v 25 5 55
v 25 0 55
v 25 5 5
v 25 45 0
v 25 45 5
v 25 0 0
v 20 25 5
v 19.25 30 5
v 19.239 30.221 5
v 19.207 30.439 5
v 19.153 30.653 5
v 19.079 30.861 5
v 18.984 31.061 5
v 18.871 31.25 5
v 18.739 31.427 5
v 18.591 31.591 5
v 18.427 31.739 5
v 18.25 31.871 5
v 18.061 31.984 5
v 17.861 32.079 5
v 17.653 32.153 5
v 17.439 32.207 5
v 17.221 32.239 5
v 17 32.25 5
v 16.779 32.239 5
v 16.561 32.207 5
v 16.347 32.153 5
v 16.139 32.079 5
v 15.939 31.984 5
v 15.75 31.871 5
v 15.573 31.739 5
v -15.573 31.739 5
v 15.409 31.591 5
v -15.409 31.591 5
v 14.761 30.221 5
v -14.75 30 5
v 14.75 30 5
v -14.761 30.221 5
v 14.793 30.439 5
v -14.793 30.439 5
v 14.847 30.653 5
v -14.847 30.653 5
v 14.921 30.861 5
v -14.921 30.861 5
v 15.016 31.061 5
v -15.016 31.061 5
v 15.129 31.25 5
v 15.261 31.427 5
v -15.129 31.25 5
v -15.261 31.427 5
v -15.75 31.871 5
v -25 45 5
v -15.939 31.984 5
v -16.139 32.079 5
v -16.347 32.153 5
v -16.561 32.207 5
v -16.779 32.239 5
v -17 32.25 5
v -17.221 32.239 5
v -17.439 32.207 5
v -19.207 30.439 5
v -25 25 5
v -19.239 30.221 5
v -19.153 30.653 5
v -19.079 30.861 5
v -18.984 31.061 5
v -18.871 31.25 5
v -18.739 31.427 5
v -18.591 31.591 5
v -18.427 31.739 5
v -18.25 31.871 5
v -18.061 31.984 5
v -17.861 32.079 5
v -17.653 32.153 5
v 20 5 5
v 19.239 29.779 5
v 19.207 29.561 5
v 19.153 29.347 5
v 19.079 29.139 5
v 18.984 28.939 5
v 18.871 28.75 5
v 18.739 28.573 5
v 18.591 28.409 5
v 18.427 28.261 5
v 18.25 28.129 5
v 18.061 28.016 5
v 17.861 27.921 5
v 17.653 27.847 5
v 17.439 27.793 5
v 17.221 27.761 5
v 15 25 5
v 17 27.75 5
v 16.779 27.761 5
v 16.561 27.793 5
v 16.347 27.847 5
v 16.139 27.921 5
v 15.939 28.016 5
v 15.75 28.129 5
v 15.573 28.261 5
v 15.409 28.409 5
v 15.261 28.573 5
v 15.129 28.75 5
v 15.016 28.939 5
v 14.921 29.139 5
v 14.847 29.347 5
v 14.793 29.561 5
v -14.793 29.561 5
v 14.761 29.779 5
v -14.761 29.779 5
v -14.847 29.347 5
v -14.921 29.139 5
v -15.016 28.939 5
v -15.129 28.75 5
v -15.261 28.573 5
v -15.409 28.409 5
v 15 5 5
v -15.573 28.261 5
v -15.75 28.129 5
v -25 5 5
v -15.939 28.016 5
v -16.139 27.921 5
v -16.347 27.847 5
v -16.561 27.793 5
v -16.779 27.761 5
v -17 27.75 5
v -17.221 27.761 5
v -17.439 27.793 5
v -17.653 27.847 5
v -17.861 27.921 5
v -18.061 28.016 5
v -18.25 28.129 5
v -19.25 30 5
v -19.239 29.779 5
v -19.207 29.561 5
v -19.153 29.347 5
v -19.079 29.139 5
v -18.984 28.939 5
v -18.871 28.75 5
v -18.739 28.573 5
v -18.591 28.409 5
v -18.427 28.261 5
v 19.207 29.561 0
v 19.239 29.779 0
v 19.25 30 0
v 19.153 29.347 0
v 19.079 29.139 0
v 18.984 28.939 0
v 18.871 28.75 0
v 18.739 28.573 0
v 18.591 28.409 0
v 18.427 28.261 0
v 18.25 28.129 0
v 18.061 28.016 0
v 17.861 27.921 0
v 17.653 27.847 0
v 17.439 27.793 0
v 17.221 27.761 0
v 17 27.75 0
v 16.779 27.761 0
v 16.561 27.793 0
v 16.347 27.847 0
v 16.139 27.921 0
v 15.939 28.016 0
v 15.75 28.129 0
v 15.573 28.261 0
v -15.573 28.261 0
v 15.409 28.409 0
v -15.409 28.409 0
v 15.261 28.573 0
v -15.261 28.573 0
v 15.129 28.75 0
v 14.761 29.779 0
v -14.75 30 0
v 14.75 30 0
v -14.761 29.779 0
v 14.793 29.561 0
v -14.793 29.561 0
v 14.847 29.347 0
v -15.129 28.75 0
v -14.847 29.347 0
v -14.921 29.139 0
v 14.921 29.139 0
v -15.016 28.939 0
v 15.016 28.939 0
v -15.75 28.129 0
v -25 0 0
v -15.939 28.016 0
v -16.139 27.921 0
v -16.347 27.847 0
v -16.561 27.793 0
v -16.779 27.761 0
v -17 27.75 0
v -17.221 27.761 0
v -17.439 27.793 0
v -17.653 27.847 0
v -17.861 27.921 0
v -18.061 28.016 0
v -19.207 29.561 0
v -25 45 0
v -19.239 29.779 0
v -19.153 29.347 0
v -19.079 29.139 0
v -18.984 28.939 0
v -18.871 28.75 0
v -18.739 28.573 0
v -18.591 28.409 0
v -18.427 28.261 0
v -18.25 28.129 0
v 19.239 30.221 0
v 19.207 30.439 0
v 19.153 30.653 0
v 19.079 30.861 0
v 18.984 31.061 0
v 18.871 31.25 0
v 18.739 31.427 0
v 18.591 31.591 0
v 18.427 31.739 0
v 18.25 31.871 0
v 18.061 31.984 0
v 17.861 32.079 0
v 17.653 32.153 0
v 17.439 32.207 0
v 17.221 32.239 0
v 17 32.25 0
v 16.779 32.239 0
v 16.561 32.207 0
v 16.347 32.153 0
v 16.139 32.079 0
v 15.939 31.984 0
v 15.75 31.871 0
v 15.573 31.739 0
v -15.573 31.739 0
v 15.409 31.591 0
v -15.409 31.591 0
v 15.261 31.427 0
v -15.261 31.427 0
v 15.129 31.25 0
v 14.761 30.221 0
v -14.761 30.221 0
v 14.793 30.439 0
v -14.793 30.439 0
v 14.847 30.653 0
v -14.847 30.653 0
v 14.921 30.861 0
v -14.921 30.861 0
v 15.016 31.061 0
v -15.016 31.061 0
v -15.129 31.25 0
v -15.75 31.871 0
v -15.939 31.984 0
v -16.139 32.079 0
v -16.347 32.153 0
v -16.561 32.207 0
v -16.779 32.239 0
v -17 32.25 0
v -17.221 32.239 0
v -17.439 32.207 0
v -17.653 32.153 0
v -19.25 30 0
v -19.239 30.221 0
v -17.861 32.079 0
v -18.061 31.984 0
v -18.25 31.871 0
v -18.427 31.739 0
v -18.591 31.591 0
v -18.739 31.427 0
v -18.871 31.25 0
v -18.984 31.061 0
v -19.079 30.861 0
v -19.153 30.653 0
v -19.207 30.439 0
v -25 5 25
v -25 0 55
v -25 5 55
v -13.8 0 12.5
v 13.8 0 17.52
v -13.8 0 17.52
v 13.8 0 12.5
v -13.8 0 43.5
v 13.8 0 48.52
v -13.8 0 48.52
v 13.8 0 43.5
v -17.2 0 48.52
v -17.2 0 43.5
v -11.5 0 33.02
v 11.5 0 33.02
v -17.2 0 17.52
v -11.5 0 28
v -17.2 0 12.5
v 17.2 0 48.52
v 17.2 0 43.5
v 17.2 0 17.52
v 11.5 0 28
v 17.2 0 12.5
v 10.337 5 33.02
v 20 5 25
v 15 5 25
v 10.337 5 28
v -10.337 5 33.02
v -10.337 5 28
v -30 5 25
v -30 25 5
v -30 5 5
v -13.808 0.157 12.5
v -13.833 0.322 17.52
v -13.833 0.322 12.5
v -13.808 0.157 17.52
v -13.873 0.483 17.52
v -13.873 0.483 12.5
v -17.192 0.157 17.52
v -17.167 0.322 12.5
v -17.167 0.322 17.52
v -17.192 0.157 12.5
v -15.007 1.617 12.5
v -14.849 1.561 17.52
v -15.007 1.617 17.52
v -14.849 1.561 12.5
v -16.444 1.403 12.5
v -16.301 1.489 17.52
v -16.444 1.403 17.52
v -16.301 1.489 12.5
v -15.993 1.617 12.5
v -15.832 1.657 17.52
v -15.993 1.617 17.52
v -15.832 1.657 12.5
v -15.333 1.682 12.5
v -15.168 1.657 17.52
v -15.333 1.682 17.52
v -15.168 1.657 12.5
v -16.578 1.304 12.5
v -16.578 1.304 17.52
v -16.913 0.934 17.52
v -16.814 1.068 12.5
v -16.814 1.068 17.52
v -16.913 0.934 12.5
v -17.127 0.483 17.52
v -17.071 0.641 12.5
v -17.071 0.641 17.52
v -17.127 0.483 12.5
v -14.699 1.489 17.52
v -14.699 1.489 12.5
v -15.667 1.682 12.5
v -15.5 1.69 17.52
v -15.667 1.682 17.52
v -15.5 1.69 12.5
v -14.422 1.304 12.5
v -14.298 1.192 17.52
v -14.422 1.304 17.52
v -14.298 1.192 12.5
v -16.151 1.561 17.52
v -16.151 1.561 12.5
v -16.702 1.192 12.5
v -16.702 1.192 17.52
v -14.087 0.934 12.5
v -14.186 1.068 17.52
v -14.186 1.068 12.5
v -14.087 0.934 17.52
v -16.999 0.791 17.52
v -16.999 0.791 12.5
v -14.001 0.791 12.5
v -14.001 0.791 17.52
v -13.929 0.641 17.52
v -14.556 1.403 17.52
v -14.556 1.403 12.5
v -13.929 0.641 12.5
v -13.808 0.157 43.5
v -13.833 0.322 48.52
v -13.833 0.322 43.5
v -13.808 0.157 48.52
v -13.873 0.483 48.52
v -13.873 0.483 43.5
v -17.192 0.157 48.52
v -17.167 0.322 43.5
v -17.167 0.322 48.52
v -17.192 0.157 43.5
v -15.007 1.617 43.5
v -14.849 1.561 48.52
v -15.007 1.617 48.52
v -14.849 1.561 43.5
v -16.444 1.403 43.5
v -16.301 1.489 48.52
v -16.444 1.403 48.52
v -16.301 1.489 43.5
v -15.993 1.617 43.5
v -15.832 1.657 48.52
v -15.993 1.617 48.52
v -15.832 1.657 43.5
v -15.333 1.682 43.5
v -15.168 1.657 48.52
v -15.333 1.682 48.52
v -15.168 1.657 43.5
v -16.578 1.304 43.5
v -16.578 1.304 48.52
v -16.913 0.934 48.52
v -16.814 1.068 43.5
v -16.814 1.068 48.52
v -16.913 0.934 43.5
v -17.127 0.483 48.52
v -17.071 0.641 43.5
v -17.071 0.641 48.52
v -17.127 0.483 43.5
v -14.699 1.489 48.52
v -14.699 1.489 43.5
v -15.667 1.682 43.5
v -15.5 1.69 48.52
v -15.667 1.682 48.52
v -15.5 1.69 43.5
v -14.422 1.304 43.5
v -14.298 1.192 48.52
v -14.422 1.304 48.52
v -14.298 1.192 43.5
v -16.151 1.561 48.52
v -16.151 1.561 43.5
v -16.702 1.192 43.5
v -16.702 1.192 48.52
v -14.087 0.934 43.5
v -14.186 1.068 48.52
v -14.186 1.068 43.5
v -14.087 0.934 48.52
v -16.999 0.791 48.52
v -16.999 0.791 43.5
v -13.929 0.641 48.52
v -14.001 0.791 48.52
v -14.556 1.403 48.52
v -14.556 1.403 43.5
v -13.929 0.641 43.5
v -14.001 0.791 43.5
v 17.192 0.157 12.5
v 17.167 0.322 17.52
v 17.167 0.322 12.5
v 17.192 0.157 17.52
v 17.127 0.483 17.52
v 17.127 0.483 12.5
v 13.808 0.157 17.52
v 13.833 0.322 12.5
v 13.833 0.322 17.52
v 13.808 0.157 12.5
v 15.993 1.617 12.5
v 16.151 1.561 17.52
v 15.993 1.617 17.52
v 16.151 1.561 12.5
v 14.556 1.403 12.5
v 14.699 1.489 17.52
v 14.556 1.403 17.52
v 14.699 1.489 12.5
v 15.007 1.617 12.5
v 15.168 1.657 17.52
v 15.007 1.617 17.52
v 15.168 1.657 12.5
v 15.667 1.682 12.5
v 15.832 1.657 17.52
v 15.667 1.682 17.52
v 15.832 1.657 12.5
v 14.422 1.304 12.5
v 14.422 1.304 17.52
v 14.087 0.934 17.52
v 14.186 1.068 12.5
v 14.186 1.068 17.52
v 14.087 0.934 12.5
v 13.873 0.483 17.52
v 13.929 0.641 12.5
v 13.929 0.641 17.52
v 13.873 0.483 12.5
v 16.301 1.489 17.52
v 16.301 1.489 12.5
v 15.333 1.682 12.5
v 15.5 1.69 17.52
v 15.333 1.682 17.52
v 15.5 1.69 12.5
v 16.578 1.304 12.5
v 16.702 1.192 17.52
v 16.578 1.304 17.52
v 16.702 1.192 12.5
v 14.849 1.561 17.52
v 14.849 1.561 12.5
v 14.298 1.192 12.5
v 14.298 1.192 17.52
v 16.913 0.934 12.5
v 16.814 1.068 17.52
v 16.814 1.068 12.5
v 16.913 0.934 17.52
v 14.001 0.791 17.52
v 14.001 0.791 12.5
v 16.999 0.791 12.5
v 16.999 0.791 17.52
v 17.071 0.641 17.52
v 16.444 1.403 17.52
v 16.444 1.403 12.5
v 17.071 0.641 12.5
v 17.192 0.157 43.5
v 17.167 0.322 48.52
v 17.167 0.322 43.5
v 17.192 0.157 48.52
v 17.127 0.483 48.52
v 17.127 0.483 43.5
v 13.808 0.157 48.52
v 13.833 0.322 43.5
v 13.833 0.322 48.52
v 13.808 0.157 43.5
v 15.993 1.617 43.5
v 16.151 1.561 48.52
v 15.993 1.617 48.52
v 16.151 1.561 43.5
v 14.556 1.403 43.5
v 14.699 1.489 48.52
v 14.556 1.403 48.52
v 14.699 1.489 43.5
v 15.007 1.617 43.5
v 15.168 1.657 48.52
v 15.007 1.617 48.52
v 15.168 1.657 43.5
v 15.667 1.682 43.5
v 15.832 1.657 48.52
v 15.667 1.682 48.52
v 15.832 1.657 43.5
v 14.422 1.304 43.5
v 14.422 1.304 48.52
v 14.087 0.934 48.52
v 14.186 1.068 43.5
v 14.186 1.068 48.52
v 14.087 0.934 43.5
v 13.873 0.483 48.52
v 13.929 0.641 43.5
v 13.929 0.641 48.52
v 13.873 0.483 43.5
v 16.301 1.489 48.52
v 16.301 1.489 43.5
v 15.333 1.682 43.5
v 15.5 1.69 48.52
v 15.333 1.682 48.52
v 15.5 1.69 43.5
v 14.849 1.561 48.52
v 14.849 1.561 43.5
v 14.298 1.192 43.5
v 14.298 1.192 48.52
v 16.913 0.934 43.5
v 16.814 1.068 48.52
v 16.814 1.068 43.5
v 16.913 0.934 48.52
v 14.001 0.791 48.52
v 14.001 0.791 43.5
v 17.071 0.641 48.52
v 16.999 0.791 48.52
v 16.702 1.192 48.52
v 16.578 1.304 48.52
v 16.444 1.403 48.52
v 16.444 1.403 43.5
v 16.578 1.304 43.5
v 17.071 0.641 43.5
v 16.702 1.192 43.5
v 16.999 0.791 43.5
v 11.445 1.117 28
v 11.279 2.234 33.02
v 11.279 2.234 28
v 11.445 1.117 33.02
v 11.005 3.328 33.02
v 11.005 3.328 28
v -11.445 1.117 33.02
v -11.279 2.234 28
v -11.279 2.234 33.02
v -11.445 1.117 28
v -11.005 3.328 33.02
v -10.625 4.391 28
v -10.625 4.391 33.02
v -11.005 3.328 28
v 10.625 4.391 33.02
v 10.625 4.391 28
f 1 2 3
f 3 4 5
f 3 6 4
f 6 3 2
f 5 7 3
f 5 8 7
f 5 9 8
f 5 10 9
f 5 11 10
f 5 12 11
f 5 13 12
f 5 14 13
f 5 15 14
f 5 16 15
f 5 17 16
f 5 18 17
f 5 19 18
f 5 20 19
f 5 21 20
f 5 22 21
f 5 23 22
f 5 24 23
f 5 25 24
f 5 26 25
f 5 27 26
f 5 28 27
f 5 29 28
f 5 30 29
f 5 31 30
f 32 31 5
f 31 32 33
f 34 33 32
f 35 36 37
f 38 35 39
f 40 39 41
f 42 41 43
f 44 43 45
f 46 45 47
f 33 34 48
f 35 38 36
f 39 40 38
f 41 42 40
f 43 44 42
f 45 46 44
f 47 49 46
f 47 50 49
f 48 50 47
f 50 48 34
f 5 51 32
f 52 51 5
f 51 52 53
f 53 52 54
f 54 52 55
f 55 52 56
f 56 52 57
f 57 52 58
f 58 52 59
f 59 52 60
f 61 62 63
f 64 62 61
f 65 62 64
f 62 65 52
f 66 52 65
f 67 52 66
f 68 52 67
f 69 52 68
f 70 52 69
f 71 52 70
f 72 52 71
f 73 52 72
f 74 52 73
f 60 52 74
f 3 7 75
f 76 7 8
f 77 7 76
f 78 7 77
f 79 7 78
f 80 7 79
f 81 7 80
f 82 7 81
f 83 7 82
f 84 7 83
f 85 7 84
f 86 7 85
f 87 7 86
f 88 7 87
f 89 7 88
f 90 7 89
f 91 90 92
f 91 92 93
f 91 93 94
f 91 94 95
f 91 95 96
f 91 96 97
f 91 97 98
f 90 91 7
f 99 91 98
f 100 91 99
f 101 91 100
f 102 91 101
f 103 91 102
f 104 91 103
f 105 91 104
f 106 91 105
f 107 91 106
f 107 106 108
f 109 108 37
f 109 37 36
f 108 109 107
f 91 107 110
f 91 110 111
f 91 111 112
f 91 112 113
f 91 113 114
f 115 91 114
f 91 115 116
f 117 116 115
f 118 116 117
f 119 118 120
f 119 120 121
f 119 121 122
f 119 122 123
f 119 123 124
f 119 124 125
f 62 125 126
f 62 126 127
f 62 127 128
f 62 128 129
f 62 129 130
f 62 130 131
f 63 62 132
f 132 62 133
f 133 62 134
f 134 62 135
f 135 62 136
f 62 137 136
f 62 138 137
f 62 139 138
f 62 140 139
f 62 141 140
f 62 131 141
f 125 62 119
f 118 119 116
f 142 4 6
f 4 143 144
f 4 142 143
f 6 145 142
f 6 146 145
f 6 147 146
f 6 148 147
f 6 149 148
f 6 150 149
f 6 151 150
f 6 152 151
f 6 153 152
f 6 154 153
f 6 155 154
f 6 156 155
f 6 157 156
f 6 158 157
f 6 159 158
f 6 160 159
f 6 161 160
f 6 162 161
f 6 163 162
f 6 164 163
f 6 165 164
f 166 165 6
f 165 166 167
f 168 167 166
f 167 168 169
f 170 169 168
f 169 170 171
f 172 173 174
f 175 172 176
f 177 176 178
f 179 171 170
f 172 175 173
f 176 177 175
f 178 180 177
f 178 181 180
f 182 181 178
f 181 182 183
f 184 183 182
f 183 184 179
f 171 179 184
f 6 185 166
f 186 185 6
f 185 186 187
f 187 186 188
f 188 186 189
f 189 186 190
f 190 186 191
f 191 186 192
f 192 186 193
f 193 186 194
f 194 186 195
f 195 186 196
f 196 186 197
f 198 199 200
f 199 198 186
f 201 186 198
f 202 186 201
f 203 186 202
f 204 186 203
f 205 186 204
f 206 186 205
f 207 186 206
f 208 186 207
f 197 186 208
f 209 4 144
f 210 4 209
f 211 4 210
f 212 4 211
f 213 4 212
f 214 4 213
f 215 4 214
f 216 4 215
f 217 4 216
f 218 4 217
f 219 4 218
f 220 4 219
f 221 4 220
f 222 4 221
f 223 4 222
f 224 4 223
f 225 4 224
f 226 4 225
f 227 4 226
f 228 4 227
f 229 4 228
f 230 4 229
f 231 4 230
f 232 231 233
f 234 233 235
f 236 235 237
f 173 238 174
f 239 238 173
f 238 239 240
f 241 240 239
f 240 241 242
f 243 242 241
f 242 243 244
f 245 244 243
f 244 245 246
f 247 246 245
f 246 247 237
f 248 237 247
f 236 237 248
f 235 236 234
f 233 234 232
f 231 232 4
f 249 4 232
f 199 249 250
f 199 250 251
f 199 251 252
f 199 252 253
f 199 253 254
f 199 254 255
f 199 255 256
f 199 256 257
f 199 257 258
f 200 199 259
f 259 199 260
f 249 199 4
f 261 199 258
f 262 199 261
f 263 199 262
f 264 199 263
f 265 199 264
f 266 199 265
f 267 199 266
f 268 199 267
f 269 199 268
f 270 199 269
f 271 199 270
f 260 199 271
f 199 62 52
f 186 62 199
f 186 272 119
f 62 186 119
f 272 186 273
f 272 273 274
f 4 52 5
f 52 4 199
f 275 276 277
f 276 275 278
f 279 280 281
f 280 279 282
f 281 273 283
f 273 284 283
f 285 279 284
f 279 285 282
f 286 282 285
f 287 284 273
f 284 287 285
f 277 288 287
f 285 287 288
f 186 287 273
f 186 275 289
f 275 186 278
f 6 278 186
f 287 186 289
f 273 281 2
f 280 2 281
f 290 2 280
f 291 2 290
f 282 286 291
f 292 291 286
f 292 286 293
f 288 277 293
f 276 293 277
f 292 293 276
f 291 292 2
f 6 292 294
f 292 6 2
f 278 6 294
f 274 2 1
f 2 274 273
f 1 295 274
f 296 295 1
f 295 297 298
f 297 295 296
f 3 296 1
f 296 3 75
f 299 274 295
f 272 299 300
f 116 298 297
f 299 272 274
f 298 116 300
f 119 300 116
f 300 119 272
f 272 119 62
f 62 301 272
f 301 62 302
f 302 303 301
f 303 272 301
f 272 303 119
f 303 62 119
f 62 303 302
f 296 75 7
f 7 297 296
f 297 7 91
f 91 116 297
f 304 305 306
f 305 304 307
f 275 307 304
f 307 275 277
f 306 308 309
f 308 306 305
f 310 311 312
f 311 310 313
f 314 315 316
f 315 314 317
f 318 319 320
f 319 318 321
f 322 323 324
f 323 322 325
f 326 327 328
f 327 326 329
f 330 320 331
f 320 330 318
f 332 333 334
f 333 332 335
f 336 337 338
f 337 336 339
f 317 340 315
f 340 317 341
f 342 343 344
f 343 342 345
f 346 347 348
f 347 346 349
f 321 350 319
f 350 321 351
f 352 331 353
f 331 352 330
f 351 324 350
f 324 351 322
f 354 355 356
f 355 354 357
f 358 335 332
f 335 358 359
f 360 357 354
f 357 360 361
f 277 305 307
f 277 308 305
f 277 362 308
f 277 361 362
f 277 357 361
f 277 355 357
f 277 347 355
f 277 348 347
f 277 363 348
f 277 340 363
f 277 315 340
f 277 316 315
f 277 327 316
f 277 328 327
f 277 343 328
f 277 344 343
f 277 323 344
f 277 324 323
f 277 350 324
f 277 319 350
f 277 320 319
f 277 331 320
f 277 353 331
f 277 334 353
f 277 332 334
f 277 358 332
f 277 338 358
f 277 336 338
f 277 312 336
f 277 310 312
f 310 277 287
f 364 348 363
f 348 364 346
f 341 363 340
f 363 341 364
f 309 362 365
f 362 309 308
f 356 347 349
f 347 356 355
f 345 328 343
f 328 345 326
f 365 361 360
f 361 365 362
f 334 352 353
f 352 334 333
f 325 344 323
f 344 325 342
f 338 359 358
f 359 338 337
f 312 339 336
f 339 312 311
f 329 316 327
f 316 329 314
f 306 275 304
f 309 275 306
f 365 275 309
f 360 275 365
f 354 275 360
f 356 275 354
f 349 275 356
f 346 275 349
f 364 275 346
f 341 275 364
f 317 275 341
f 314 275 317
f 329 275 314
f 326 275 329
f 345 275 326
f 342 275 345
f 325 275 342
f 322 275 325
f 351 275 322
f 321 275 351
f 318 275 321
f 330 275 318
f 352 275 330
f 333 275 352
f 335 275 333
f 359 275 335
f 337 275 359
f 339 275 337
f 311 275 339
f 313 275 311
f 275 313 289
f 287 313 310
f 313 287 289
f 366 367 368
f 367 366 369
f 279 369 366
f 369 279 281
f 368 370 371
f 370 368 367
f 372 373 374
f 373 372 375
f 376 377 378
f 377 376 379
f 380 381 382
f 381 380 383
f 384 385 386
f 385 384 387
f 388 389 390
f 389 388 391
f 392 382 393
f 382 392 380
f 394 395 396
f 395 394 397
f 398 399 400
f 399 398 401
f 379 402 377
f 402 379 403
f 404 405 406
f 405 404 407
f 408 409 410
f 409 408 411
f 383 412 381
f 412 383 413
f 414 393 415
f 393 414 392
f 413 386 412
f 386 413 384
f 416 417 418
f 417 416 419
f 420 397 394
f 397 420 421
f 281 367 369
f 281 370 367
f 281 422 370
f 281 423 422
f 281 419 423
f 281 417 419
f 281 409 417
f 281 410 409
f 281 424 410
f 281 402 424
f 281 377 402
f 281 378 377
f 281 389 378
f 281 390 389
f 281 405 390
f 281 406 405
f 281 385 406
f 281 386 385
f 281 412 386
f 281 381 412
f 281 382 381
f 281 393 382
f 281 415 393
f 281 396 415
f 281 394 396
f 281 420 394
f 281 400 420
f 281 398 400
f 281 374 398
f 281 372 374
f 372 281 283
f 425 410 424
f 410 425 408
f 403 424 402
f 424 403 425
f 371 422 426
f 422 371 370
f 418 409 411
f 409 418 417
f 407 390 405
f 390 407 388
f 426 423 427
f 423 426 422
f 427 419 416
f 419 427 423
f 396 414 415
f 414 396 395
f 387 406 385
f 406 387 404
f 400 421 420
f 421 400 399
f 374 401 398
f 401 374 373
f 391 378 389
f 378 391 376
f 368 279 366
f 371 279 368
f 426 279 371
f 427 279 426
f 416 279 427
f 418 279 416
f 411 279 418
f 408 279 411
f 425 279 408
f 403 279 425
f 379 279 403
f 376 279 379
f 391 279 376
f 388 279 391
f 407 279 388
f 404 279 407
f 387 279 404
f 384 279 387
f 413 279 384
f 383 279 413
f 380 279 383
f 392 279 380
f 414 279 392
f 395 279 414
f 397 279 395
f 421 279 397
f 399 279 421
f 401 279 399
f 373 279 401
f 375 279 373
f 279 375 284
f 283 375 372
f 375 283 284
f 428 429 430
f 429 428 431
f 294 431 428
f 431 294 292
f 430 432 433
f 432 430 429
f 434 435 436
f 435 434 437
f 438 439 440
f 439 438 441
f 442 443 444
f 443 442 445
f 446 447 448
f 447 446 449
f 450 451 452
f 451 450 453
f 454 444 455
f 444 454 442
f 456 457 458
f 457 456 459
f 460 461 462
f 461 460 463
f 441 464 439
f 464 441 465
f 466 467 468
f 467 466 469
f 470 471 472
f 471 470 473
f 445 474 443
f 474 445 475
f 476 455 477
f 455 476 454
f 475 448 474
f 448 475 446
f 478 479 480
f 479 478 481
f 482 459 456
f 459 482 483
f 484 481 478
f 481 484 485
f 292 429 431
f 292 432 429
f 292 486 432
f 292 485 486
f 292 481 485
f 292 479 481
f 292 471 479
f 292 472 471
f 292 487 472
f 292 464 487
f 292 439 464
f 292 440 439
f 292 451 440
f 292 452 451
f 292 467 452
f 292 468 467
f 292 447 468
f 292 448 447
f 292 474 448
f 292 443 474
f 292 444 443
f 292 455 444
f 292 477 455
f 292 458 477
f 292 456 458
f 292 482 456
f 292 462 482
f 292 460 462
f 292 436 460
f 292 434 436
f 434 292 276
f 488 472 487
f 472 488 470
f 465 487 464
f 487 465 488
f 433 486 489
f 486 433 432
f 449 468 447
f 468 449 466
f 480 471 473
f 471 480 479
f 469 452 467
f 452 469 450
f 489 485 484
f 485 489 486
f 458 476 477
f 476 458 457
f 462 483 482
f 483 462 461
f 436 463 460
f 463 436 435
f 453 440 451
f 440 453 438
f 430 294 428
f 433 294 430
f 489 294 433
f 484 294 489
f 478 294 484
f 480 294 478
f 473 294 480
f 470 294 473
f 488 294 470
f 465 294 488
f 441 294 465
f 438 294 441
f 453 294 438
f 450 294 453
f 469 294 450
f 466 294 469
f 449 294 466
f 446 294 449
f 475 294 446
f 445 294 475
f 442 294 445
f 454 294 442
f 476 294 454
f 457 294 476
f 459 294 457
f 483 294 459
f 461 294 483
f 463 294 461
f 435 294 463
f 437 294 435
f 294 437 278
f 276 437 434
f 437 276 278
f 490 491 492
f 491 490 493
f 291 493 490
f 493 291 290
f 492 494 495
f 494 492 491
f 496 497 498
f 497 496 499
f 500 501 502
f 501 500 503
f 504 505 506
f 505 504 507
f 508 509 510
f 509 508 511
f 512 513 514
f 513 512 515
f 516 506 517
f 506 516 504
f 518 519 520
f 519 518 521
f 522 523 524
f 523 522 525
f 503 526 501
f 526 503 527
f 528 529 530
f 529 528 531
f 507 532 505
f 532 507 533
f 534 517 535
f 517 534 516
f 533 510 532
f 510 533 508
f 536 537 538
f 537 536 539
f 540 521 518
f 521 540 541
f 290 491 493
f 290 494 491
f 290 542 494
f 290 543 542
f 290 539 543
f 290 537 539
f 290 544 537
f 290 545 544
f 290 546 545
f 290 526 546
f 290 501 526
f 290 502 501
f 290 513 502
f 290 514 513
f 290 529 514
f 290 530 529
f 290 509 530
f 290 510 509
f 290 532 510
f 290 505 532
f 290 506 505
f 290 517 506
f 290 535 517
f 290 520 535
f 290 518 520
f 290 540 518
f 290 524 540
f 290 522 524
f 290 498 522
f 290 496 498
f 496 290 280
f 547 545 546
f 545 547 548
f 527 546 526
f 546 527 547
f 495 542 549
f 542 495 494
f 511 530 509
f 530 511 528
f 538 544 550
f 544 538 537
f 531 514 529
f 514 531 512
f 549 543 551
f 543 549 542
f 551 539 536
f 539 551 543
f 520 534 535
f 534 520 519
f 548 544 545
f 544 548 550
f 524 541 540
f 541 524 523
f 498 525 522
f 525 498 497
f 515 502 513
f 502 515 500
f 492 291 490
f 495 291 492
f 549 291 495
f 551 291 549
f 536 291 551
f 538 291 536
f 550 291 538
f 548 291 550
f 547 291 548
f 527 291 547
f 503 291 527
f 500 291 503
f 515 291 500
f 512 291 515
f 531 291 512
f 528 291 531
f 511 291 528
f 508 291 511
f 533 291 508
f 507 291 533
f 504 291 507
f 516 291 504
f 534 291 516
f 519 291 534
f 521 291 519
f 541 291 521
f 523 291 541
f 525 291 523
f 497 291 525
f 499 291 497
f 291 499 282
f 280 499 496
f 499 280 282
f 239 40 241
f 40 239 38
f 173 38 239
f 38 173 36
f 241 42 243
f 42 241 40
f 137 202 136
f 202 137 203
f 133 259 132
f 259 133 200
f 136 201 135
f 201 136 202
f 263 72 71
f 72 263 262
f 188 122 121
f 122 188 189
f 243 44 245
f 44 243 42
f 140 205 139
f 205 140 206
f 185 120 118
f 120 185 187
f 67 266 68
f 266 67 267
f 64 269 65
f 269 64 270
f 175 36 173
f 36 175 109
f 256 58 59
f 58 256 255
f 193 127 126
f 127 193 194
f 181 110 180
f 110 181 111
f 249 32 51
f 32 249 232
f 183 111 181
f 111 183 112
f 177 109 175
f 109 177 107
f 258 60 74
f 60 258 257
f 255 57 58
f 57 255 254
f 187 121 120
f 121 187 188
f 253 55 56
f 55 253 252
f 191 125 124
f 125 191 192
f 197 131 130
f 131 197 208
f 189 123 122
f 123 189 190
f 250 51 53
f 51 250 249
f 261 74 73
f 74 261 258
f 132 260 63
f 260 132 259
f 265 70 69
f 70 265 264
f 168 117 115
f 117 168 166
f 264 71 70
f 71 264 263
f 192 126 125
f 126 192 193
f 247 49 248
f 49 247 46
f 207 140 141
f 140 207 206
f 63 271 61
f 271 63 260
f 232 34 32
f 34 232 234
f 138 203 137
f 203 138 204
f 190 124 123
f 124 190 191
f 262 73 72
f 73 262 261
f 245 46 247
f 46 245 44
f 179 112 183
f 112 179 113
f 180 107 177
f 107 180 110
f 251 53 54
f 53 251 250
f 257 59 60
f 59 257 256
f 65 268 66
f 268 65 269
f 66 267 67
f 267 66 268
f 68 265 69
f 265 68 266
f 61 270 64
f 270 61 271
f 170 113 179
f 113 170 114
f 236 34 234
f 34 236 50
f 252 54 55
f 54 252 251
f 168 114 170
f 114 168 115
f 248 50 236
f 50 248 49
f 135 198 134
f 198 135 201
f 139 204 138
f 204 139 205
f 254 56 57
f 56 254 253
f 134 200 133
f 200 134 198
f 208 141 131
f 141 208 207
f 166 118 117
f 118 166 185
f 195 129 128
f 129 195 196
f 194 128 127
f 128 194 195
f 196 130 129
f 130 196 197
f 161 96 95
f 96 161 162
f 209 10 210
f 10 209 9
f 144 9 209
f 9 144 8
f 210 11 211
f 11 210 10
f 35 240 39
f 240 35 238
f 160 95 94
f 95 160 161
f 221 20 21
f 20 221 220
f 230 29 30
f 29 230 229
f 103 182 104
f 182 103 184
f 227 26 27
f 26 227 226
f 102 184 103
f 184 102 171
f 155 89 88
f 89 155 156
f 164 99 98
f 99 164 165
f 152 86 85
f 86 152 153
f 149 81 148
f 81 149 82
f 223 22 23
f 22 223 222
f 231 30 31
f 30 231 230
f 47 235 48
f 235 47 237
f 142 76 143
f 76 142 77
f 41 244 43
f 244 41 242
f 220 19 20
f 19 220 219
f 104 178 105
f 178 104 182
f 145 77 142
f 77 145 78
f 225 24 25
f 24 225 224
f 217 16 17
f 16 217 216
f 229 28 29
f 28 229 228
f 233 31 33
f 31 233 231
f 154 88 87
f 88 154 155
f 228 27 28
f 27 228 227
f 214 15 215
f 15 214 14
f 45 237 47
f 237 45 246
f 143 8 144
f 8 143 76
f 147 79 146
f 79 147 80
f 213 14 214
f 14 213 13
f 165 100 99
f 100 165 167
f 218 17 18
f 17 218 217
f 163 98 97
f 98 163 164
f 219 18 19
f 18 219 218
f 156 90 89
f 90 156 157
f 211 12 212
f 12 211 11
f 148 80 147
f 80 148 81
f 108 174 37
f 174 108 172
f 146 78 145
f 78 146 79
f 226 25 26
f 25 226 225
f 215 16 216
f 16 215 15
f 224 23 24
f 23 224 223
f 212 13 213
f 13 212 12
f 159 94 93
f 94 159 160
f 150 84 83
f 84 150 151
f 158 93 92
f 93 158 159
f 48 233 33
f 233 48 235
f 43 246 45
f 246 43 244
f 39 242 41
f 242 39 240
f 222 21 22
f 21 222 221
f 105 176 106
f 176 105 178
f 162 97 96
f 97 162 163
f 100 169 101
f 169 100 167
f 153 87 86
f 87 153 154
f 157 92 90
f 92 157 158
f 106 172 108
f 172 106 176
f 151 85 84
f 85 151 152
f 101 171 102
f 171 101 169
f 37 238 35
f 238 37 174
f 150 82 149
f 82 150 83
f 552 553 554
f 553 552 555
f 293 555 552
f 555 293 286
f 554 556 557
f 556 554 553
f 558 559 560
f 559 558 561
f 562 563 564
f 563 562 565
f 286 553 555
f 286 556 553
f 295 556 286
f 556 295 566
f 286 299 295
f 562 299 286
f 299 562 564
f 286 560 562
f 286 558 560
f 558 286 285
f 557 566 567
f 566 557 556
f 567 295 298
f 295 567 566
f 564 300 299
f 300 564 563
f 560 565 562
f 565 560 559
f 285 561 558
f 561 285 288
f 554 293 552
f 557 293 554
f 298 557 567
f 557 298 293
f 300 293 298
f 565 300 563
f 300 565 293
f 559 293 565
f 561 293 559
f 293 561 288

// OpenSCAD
// NEMA 17 Stepper Motor L-Bracket for Syringe Pump
// Corrected version to match exact dimensions and ensure watertightness

// --- Dimensions ---
// Base Plate
base_width_x = 50;           // Total width (-25 to 25)
base_depth_y = 45;           // Total depth (0 to 45)
base_height_z = 5;           // Thickness of base
base_hole_dia = 4.5;         // M4 screw holes
base_hole_x1 = -17;          // X position of hole 1
base_hole_x2 = 17;           // X position of hole 2
base_hole_y = 30;            // Y position of holes

// Vertical Motor Plate
motor_plate_width_x = 50;    // Total width (-25 to 25)
motor_plate_depth_y = 5;     // Thickness of vertical plate
motor_plate_height_z = 50;   // Total height (0 to 50)

// Motor Mounting Features (on Vertical Plate)
boss_hole_dia = 23;          // Centering boss hole diameter
boss_hole_x = 0;             // Center X of boss hole
boss_hole_z = 28;            // Center Z of boss hole

screw_hole_dia = 3.4;        // M3 screw holes
screw_pattern_size = 31;     // Square pattern for M3 screws
screw_offset = screw_pattern_size / 2;

// Gussets
gusset_thickness = 5;        // Thickness of gussets
gusset_leg_y = 20;           // Leg length along Y
gusset_leg_z = 20;           // Leg length along Z
gusset_x_outer = 25;         // Outer X edge
gusset_x_inner = 20;         // Inner X edge

// --- Constants ---
$fn = 64;
eps = 0.01; // Small epsilon for watertightness

// --- Main Assembly ---

difference() {
    // 1. Combined Solid Geometry
    union() {
        // Base Plate
        // Centered on X, starts at Y=0, Z=0
        translate([-base_width_x/2, 0, 0])
            cube([base_width_x, base_depth_y, base_height_z]);

        // Vertical Motor Plate
        // Centered on X, starts at Y=0, Z=base_height_z (5)
        // Height is 50, so top is at Z=55. 
        // Note: To ensure the total height is 50 as per spec, 
        // we define the plate height as 50 and place it at Z=5.
        translate([-motor_plate_width_x/2, 0, base_height_z])
            cube([motor_plate_width_x, motor_plate_depth_y, motor_plate_height_z]);

        // Gussets
        // Left Gusset: Right triangle in YZ plane
        // Corner at y=5, z=5. Flush with left edge (x=-25 to -20)
        // We use a union to ensure gussets are part of the main body
        translate([-gusset_x_outer, 5, 5])
            rotate([0, -90, 0]) 
                linear_extrude(gusset_thickness)
                    polygon(points=[[0,0], [gusset_leg_y, 0], [0, gusset_leg_z]]);

        // Right Gusset: Flush with right edge (x=20 to 25)
        translate([gusset_x_inner, 5, 5])
            rotate([0, -90, 0]) 
                linear_extrude(gusset_thickness)
                    polygon(points=[[0,0], [gusset_leg_y, 0], [0, gusset_leg_z]]);
    }

    // --- Subtraction Operations ---

    // M4 Holes in Base Plate (Vertical through holes)
    translate([base_hole_x1, base_hole_y, -eps])
        cylinder(d=base_hole_dia, h=base_height_z + 2*eps);
    translate([base_hole_x2, base_hole_y, -eps])
        cylinder(d=base_hole_dia, h=base_height_z + 2*eps);

    // Boss Centering Hole (through the vertical plate along Y)
    // Plate is at Y=0 to 5. Center is at Y=2.5.
    translate([boss_hole_x, -eps, boss_hole_z])
        cylinder(d=boss_hole_dia, h=motor_plate_depth_y + 2*eps);

    // M3 Screw Holes (4 holes in square pattern)
    // Centered on the boss hole (0, 28)
    for (px = [-screw_offset, screw_offset]) {
        for (pz = [-screw_offset, screw_offset]) {
            translate([px, -eps, boss_hole_z + pz])
                cylinder(d=screw_hole_dia, h=motor_plate_depth_y + 2*eps);
        }
    }
}
